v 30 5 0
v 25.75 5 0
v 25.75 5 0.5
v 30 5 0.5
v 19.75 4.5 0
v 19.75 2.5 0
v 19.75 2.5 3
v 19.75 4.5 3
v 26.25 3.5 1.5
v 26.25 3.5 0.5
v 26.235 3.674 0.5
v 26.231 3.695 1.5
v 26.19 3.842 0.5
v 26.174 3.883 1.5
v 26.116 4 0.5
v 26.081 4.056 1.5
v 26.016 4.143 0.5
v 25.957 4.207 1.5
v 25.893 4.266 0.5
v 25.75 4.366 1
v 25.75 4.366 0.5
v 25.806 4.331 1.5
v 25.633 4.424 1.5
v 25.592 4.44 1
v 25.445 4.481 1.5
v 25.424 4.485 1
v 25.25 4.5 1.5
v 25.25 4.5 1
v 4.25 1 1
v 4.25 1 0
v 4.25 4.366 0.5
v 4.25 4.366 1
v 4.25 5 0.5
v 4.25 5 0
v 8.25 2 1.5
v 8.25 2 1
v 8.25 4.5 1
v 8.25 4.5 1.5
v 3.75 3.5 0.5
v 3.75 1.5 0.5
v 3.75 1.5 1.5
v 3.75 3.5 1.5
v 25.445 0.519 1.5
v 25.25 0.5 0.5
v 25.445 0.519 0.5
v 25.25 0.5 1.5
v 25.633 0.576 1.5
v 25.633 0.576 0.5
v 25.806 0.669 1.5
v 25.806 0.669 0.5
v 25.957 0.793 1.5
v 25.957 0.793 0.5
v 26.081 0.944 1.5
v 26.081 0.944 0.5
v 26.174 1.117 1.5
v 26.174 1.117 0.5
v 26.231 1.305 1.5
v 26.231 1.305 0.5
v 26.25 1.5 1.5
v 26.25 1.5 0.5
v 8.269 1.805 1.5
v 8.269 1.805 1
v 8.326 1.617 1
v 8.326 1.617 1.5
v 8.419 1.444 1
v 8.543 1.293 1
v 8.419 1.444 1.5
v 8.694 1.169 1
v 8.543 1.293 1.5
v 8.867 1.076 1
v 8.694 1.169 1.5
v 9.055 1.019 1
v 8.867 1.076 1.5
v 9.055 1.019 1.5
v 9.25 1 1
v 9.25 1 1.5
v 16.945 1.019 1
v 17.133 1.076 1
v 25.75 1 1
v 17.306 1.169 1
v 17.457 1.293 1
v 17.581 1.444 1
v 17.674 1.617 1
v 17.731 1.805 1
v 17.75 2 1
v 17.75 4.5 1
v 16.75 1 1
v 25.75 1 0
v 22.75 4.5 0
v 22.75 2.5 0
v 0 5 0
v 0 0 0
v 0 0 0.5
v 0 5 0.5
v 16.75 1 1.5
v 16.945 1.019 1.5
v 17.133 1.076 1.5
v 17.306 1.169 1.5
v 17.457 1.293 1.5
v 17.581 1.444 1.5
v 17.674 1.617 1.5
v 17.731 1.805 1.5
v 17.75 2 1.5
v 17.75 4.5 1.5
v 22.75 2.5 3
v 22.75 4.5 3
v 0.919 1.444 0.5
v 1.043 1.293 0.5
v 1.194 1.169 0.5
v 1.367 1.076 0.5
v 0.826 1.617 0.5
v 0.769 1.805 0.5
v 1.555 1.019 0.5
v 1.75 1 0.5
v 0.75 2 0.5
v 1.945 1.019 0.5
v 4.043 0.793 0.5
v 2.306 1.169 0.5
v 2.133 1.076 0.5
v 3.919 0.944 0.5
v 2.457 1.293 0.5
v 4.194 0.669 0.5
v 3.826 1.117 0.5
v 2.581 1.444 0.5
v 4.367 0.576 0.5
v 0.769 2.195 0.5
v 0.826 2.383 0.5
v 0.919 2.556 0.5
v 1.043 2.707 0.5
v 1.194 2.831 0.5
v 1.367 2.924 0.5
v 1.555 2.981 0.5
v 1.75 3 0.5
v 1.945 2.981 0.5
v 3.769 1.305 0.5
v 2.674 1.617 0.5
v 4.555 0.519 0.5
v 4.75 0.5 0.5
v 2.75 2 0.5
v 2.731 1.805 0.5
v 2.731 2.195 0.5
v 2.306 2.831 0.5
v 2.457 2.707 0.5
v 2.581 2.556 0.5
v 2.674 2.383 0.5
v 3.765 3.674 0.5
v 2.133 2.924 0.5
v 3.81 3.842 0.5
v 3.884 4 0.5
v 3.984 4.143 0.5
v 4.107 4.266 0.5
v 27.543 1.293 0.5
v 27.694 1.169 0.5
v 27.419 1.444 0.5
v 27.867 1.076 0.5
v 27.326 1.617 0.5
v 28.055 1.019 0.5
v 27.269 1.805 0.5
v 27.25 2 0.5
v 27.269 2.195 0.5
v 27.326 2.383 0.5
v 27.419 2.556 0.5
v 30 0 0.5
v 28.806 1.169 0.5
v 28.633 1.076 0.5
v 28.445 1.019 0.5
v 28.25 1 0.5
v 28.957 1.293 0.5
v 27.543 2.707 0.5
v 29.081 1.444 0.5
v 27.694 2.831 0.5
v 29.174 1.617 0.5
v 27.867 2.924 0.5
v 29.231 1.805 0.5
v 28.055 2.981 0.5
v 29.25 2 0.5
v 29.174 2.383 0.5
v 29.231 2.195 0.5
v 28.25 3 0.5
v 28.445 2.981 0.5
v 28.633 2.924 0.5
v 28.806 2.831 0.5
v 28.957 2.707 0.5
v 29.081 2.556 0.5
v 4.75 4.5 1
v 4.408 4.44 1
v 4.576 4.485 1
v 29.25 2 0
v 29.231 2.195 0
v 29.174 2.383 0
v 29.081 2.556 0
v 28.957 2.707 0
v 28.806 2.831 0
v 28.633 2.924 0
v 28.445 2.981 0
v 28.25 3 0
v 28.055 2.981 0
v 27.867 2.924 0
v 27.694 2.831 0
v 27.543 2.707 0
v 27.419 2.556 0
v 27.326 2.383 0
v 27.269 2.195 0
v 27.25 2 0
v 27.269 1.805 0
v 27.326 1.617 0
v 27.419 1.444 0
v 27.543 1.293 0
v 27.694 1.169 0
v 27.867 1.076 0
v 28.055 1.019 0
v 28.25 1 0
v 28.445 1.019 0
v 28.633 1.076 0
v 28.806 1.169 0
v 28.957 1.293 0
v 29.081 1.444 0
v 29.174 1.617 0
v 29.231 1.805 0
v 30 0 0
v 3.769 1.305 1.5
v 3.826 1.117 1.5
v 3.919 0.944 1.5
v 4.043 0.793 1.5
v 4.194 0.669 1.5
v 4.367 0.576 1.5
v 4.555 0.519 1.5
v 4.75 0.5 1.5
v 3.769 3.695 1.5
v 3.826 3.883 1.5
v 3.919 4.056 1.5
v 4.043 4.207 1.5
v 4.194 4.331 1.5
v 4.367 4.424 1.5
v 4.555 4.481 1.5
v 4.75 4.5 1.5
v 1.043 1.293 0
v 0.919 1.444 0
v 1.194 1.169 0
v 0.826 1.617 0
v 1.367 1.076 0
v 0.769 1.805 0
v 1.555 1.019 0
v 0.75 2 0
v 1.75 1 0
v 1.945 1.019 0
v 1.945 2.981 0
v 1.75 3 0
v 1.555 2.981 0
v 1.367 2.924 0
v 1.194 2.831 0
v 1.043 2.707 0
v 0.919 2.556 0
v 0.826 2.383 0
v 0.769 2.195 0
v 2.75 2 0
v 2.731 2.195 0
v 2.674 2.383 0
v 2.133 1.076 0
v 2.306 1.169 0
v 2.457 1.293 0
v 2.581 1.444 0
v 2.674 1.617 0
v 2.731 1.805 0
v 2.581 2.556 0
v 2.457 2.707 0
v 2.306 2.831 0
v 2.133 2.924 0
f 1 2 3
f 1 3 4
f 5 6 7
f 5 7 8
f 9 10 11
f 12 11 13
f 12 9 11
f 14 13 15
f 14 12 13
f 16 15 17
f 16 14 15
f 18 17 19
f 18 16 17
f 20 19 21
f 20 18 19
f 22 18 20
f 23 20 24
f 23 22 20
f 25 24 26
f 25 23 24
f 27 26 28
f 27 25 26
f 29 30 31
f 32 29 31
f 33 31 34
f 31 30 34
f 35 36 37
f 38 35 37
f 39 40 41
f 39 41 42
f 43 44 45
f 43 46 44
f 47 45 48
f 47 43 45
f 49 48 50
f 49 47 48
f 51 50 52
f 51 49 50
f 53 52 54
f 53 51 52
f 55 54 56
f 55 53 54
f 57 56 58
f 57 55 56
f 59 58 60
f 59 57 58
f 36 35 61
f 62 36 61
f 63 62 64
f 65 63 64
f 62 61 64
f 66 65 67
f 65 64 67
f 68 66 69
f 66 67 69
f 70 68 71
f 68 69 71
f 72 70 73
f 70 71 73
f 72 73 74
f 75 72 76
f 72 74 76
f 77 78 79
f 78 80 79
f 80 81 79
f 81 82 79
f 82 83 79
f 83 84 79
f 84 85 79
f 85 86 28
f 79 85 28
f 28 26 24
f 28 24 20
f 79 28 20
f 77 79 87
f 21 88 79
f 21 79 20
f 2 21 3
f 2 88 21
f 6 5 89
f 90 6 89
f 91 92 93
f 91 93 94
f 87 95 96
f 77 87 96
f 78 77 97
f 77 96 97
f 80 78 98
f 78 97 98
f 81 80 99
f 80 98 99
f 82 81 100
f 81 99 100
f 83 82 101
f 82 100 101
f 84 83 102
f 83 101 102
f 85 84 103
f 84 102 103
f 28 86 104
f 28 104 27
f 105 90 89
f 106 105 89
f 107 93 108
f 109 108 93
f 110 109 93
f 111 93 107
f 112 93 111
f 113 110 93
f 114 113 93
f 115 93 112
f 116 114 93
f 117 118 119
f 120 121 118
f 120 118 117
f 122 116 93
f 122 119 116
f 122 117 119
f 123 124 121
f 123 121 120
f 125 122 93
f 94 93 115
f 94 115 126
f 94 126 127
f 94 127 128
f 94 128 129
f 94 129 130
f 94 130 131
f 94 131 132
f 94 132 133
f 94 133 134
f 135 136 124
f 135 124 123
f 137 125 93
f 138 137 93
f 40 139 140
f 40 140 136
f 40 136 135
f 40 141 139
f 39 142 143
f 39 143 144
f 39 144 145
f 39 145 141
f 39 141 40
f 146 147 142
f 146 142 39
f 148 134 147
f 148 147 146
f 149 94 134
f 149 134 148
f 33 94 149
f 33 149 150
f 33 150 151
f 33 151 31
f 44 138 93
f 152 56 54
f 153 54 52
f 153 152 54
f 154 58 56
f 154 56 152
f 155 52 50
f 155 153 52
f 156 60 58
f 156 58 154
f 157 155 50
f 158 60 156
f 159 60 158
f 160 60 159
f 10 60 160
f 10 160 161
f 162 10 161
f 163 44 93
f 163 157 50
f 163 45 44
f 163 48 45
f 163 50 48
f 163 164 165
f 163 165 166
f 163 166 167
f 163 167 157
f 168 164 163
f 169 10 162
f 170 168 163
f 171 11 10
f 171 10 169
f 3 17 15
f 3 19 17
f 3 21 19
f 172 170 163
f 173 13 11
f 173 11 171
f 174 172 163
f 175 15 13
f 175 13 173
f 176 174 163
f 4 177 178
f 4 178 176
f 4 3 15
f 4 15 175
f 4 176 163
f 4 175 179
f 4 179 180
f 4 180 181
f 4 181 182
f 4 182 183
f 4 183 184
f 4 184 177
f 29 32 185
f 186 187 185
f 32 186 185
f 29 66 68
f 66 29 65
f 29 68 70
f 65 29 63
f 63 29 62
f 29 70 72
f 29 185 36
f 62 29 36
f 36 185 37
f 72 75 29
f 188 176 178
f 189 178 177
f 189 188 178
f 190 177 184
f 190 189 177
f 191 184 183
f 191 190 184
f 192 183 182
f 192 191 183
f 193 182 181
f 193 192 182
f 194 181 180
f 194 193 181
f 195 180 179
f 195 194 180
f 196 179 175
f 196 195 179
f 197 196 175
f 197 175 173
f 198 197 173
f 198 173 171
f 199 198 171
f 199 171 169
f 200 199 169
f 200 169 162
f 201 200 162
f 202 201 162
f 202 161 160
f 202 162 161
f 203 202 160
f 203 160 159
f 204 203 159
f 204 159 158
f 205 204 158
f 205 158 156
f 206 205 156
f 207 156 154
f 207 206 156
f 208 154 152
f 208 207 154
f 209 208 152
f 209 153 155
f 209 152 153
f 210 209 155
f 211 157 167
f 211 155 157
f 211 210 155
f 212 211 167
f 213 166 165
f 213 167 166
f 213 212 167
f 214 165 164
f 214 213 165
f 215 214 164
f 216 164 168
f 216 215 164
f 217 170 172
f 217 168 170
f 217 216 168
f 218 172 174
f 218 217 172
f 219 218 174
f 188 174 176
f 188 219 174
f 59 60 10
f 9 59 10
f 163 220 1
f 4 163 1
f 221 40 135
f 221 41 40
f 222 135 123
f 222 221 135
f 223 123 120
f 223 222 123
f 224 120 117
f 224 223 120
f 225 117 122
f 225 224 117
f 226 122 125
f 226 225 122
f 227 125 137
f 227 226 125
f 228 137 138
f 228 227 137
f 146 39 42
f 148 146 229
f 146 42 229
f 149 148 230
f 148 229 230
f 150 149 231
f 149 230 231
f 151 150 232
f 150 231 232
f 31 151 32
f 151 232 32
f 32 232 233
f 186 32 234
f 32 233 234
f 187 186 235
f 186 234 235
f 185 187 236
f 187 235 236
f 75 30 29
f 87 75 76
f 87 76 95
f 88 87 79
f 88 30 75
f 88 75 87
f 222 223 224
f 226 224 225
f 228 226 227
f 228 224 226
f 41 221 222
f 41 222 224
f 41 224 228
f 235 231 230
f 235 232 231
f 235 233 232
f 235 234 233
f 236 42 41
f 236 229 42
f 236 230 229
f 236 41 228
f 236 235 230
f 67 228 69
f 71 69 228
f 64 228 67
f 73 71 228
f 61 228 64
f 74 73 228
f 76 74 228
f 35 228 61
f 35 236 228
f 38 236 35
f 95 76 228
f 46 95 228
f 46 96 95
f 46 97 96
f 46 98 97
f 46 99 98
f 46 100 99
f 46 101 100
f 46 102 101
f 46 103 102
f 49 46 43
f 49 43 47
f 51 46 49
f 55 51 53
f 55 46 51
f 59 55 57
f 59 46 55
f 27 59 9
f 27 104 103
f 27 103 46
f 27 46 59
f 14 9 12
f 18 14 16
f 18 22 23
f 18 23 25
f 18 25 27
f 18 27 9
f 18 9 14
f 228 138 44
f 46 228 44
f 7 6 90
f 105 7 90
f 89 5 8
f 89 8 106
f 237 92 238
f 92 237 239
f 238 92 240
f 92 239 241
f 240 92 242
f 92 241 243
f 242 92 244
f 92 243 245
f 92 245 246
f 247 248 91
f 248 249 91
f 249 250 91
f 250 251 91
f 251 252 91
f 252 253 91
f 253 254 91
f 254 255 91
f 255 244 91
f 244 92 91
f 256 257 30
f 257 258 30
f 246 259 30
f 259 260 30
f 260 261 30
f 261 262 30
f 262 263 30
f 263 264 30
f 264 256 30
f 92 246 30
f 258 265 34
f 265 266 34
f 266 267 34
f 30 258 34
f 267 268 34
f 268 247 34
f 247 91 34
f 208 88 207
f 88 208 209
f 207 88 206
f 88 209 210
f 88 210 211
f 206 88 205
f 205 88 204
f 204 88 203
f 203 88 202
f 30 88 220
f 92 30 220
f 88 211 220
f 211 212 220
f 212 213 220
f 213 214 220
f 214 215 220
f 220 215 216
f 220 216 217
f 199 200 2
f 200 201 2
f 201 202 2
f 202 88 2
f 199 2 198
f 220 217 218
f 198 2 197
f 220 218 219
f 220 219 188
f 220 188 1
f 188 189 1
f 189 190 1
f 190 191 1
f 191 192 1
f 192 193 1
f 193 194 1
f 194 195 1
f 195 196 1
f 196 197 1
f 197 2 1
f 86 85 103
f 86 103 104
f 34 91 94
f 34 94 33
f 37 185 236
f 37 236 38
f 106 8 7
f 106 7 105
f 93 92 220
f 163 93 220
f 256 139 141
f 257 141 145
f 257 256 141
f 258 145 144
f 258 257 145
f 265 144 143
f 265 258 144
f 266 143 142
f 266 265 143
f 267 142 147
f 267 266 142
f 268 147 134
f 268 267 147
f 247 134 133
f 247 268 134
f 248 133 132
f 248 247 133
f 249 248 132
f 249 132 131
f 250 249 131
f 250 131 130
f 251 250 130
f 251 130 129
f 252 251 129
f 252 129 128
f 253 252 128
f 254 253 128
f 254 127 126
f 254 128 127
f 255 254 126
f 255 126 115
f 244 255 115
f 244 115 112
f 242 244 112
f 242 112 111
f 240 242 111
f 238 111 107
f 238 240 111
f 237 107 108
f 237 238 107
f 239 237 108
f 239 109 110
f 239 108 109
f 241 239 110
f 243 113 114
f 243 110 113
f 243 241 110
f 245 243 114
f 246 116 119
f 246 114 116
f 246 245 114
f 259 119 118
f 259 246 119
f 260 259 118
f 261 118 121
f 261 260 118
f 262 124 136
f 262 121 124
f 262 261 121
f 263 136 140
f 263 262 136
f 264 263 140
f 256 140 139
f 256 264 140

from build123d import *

# Parameters (mm, degrees)
BOX003_W          = 3
BOX003_H          = 2
BOX003_DEPTH      = 3
BOX004_W          = 21.5
BOX004_H          = 4
BOX004_DEPTH      = 1
BOX002_W          = 9.5
BOX002_H          = 3.5
BOX002_DEPTH      = 1.5
FILLET001_R       = 1
CYLINDER_R        = 1
CYLINDER_DEPTH    = 10
CYLINDER001_R     = 1
CYLINDER001_DEPTH = 10
BOX_W             = 30
BOX_H             = 5
BOX_DEPTH         = 0.5
BOX001_W          = 22.5
BOX001_H          = 4
BOX001_DEPTH      = 1
FILLET_R          = 1


with BuildPart() as cube003_switch:
    # Box003 → Box003 (new body)
    with BuildSketch(Plane(origin=(19.75, 2.5, 0), x_dir=(1, 0, 0), z_dir=(0, 0, 1))):
        with Locations((1.5, 1)):
            Rectangle(BOX003_W, BOX003_H)
    extrude(amount=BOX003_DEPTH)


with BuildPart() as cube002_back_cutter:
    # Box004 → Box004 (new body)
    with BuildSketch(Plane(origin=(4.25, 1, 0), x_dir=(1, 0, 0), z_dir=(0, 0, 1))):
        with Locations((10.75, 2)):
            Rectangle(BOX004_W, BOX004_H)
    extrude(amount=BOX004_DEPTH)


with BuildPart() as fillet001:
    # Box002 → Box002 (new body)
    with BuildSketch(Plane(origin=(8.25, 1, 0), x_dir=(1, 0, 0), z_dir=(0, 0, 1))):
        with Locations((4.75, 1.75)):
            Rectangle(BOX002_W, BOX002_H)
    extrude(amount=BOX002_DEPTH)

    # Fillet001
    fillet001_edges = [fillet001.edges().sort_by_distance(p)[0] for p in [
        (8.25, 1, 0.75),
        (17.75, 1, 0.75),
    ]]
    fillet(fillet001_edges, radius=FILLET001_R)


with BuildPart() as cylinder:
    # Cylinder → Cylinder (new body)
    with BuildSketch(Plane(origin=(1.75, 2, 0), x_dir=(1, 0, 0), z_dir=(0, 0, 1))):
        Circle(CYLINDER_R)
    extrude(amount=CYLINDER_DEPTH)


with BuildPart() as fusion:
    # Cylinder001 → Cylinder001 (new body)
    with BuildSketch(Plane(origin=(28.25, 2, 0), x_dir=(1, 0, 0), z_dir=(0, 0, 1))):
        Circle(CYLINDER001_R)
    extrude(amount=CYLINDER001_DEPTH)

    # Fusion: union Cylinder
    add(cylinder.part)


with BuildPart() as cube_backing:
    # Box → Box (new body)
    with BuildSketch(Plane.XY):
        with Locations((15, 2.5)):
            Rectangle(BOX_W, BOX_H)
    extrude(amount=BOX_DEPTH)


with BuildPart() as cut002:
    # Box001 → Box001 (new body)
    with BuildSketch(Plane(origin=(3.75, 0.5, 0.5), x_dir=(1, 0, 0), z_dir=(0, 0, 1))):
        with Locations((11.25, 2)):
            Rectangle(BOX001_W, BOX001_H)
    extrude(amount=BOX001_DEPTH)

    # Fillet
    fillet_edges = [cut002.edges().sort_by_distance(p)[0] for p in [
        (3.75, 0.5, 1),
        (3.75, 4.5, 1),
        (26.25, 0.5, 1),
        (26.25, 4.5, 1),
    ]]
    fillet(fillet_edges, radius=FILLET_R)

    # Fusion003: union Cube(backing)
    add(cube_backing.part)

    # Cut: cut Fusion
    add(fusion.part, mode=Mode.SUBTRACT)

    # Cut001: cut Fillet001
    add(fillet001.part, mode=Mode.SUBTRACT)

    # Cut002: cut Cube002(back_cutter)
    add(cube002_back_cutter.part, mode=Mode.SUBTRACT)


solid = Compound([cube003_switch.part, cut002.part])
